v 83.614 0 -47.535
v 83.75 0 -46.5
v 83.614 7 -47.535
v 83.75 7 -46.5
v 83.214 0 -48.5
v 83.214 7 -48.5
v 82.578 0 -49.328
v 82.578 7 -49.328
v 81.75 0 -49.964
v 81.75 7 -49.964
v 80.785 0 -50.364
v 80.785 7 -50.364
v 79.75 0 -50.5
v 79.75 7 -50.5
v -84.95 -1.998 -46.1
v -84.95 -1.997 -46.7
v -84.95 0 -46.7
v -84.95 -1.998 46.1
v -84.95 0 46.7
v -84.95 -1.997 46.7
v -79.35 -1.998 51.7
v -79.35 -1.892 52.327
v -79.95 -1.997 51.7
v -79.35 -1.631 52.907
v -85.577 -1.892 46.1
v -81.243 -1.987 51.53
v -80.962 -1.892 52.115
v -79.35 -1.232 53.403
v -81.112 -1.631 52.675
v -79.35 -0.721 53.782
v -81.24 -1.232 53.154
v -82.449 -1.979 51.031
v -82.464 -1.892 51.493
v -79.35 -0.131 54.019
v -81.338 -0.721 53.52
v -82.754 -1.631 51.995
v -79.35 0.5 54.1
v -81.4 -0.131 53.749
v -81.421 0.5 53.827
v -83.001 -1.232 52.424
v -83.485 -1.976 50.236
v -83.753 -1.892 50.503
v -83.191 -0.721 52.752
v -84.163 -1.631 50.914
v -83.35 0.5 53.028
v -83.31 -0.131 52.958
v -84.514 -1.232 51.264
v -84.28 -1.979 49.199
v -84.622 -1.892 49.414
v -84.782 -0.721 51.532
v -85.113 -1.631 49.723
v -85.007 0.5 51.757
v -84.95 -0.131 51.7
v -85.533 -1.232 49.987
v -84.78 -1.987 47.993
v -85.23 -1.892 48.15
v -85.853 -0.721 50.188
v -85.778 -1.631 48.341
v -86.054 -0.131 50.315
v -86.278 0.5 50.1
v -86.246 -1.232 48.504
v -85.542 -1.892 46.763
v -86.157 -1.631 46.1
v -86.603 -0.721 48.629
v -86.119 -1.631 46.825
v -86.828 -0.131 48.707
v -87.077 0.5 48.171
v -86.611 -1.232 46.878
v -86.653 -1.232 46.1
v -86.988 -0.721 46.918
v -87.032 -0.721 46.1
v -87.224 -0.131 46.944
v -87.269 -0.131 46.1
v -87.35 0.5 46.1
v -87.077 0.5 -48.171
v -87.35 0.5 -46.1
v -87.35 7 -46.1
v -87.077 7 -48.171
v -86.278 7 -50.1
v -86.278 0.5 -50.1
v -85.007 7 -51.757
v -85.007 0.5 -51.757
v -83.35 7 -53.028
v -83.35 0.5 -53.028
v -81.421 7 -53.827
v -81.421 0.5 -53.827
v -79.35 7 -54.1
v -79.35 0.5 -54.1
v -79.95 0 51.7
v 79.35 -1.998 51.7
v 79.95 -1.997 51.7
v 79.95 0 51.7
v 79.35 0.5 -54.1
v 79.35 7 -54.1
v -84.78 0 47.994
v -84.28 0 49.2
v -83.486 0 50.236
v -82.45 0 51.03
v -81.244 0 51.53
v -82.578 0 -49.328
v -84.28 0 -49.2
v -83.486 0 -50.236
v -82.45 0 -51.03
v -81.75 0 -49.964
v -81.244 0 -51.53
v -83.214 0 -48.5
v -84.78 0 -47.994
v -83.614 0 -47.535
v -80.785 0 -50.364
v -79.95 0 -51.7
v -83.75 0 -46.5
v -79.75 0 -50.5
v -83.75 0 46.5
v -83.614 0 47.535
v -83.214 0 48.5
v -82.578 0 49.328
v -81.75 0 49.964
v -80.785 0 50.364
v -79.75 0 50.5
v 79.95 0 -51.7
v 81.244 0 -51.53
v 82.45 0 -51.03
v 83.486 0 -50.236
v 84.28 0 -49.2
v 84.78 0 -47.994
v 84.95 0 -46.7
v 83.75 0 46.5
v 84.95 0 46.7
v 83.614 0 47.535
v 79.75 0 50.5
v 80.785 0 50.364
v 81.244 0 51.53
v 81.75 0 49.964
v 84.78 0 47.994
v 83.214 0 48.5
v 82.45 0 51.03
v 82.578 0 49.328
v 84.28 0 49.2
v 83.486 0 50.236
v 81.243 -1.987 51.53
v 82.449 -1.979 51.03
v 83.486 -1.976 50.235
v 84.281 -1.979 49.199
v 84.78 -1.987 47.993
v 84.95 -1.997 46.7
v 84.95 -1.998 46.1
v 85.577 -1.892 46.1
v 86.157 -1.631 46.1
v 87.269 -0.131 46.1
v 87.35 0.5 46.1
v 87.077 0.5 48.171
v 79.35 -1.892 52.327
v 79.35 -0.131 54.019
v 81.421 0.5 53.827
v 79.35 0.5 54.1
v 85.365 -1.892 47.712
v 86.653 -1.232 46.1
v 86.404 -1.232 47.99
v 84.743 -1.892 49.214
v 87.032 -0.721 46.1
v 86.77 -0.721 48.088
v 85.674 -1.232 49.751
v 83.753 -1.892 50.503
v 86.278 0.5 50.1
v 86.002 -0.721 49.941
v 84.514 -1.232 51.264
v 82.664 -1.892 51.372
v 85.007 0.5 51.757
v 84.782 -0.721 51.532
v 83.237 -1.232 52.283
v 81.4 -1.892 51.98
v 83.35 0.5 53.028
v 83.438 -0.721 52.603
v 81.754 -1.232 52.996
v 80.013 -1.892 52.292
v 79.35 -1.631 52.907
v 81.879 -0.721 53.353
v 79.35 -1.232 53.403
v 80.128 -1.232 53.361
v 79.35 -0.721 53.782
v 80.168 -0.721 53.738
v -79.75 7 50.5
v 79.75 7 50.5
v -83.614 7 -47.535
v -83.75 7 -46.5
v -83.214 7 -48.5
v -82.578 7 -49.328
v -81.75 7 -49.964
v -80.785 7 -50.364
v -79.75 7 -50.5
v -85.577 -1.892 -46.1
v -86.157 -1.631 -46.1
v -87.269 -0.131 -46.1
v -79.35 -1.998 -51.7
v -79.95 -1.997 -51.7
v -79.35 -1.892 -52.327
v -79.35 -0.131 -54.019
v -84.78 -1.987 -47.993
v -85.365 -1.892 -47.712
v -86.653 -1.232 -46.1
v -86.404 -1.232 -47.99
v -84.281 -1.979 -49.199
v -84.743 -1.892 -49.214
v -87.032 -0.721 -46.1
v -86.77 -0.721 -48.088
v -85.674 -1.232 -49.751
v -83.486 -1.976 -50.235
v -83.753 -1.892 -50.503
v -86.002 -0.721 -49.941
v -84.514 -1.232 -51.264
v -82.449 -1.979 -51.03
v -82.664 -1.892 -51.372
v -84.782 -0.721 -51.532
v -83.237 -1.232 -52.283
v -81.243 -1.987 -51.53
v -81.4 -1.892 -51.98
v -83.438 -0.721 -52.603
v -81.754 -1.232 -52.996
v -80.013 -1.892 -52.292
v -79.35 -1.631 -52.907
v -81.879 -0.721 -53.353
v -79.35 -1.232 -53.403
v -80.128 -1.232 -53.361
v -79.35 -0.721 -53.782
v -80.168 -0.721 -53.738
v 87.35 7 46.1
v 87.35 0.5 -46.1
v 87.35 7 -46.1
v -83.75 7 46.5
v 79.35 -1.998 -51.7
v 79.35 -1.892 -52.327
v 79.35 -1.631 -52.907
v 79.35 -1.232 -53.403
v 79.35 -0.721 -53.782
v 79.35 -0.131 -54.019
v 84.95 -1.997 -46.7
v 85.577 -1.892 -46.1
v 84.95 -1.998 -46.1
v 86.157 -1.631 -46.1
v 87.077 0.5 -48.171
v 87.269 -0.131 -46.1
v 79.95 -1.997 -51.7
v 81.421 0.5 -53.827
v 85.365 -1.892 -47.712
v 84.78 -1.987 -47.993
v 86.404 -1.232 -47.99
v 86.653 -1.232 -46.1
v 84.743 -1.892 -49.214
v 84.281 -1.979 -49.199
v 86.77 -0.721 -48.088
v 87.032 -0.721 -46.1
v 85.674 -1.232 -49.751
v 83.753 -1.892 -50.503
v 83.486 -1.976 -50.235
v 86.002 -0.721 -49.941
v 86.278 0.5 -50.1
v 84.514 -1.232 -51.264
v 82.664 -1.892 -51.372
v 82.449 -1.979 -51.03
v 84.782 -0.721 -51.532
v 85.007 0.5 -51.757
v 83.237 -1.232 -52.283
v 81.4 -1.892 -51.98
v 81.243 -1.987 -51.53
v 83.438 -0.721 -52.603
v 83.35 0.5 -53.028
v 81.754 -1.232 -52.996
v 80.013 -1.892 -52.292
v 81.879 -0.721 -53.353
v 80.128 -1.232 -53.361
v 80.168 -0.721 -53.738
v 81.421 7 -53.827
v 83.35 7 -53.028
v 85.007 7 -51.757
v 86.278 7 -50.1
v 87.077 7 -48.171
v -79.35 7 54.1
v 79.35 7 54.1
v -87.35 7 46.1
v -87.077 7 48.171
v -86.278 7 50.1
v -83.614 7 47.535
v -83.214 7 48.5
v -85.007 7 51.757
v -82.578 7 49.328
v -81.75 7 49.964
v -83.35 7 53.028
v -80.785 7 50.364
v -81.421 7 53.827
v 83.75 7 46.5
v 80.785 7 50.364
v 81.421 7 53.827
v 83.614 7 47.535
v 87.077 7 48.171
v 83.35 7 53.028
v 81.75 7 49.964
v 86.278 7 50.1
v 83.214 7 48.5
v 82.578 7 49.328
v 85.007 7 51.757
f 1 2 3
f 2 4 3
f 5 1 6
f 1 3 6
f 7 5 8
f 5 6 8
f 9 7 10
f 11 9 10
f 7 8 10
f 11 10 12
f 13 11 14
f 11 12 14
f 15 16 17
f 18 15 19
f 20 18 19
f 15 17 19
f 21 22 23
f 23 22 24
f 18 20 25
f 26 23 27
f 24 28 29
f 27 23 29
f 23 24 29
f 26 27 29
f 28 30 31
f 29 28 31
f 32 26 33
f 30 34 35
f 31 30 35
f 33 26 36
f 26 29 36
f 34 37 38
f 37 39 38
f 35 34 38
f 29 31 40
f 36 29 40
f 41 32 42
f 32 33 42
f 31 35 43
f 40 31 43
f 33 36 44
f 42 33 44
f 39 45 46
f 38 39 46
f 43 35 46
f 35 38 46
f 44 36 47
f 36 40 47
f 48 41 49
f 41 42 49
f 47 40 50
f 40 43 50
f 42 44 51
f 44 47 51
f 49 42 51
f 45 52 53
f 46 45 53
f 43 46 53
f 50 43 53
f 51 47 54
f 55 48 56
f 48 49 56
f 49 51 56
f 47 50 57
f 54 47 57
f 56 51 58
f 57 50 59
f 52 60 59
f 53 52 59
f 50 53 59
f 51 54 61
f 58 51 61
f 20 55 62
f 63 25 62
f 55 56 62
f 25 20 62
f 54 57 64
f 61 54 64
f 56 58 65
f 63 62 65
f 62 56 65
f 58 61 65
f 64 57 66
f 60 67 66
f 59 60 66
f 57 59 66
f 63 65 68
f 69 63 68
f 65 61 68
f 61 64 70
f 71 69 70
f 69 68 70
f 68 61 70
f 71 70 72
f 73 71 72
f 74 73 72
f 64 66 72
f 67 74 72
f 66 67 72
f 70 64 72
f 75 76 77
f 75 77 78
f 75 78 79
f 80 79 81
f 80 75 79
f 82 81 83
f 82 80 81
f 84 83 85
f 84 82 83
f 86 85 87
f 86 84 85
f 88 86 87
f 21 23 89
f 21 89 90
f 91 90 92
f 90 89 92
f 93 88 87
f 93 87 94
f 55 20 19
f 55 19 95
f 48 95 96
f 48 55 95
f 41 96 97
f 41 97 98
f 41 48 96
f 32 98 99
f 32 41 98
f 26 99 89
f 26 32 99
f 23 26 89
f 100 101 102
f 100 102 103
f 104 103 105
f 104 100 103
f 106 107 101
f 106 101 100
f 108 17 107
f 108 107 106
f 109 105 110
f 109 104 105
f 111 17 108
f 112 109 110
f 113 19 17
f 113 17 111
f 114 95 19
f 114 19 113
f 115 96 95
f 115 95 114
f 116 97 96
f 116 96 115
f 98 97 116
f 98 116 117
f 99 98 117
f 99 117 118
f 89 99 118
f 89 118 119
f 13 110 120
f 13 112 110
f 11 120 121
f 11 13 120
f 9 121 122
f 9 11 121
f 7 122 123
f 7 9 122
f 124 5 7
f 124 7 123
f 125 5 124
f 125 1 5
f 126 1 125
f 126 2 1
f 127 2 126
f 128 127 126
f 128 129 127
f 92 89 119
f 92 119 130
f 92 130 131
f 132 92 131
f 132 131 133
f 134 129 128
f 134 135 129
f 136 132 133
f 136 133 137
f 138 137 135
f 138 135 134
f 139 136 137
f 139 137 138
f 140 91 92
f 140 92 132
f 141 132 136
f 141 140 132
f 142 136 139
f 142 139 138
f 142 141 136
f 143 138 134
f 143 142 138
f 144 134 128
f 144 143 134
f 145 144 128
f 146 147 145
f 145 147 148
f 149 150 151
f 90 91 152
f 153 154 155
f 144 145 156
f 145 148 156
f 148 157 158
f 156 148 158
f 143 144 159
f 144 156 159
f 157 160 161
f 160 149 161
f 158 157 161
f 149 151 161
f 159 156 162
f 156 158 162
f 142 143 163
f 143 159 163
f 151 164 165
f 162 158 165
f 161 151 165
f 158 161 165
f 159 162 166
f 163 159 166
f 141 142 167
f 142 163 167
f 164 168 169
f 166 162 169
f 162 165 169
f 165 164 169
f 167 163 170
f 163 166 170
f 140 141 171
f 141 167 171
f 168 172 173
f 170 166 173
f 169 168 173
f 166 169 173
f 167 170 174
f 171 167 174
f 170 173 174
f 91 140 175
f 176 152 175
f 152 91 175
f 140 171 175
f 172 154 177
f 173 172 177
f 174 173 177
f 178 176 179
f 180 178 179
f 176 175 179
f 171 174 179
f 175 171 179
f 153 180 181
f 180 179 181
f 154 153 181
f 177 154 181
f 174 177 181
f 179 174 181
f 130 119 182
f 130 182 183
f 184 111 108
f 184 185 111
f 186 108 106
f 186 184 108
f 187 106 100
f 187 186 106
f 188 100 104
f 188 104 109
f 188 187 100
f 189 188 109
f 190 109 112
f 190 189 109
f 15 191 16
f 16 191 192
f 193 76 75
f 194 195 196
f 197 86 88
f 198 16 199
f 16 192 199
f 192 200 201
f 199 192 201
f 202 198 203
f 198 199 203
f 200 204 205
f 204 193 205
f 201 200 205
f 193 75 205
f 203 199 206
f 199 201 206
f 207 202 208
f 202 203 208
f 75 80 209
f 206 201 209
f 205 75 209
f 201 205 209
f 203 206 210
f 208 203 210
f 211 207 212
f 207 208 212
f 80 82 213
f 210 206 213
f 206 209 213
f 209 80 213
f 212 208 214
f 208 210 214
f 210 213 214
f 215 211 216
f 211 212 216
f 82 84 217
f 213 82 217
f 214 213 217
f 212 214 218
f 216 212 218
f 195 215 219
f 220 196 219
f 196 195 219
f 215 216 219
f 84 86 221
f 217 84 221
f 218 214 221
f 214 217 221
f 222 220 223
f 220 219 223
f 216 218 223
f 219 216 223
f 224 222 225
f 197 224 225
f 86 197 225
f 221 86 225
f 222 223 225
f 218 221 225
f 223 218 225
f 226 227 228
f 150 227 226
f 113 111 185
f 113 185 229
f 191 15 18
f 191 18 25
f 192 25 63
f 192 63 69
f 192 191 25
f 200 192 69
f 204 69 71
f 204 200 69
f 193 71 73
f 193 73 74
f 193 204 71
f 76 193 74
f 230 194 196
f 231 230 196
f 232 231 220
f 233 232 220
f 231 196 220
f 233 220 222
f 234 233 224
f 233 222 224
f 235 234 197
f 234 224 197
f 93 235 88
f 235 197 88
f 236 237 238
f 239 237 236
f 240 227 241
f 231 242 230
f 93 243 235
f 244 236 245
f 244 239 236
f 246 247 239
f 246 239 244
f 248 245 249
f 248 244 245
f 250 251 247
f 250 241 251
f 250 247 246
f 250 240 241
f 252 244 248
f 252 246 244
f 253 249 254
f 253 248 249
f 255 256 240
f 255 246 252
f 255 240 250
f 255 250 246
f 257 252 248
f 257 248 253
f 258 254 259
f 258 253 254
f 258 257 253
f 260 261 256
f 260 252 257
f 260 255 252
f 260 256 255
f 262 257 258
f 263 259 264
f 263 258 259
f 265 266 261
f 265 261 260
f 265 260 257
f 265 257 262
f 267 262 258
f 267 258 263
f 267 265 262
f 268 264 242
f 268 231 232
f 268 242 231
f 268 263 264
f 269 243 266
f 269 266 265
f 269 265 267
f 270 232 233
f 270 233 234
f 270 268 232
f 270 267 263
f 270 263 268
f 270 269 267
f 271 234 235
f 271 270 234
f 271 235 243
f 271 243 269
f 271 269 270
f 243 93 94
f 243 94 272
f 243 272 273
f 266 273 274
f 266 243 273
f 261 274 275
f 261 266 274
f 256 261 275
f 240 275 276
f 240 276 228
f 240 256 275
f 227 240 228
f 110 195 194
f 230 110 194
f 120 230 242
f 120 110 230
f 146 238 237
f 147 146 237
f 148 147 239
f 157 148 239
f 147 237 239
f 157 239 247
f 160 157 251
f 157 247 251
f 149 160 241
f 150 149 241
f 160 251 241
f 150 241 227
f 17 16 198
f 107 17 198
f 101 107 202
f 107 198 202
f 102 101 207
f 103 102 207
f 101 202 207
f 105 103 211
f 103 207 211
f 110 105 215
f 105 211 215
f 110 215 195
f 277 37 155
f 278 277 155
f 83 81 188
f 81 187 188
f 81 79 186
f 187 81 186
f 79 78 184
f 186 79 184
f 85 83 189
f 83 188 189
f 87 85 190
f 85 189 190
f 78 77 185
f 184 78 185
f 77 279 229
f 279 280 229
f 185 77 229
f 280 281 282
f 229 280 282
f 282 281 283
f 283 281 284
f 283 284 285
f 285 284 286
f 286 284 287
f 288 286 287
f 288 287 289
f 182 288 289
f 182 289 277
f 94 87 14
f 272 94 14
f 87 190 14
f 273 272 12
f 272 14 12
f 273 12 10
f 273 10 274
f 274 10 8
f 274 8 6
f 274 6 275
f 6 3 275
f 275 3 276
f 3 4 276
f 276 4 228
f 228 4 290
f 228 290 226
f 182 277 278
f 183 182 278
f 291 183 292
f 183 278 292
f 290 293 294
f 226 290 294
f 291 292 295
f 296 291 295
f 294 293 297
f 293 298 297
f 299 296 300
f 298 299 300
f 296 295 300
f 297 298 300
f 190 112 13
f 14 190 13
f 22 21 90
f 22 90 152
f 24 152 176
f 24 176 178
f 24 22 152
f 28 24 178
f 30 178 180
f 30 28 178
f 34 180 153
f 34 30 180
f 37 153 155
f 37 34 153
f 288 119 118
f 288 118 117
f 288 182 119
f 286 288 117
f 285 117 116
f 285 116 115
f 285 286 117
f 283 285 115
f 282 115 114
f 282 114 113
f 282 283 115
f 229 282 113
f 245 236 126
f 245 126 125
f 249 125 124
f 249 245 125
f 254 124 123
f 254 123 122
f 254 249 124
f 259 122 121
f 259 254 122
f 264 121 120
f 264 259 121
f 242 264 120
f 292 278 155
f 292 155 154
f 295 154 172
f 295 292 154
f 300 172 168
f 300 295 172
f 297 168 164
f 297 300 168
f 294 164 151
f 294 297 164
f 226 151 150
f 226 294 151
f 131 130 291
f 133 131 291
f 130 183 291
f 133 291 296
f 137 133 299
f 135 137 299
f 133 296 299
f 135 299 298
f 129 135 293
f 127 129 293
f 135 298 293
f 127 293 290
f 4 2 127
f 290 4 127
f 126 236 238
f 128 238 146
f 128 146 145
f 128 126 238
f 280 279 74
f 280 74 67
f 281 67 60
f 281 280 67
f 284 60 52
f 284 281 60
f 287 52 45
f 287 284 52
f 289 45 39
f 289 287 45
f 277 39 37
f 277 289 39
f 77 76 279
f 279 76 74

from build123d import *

# Parameters (mm, degrees)
F0_W         = 174.7
F0_H         = 108.2
F0_W_2       = 169.9
F0_H_2       = 103.4
F1_DEPTH     = 2
F0_W_3       = 167.5
F0_H_3       = 101
F2_DEPTH     = 7
F3_R         = 4
F4_R         = 5
F5_R         = 8
F6_T1_DEPTH  = 158.7
F6_T3_DEPTH  = 92.2
F6_T6_ANGLE  = 90
F6_T8_ANGLE  = 90
F6_T10_ANGLE = 90
F6_T12_ANGLE = 90


# Not quite as in the source:
# - a fillet or chamfer that OpenCascade refuses, or shapes differently, is made with other operations: its cross-section is extruded or revolved along the edge and cut away or added


with BuildPart() as f1:
    # F0 (on Front) → F1 (new body)
    with BuildSketch(Plane.XZ):
        Rectangle(F0_W, F0_H)
        Rectangle(F0_W_2, F0_H_2, mode=Mode.SUBTRACT)
    extrude(amount=F1_DEPTH)

    # F0 (on Front) → F2 (join)
    with BuildSketch(Plane.XZ):
        Rectangle(F0_W, F0_H)
        Rectangle(F0_W_2, F0_H_2, mode=Mode.SUBTRACT)
        Rectangle(F0_W_2, F0_H_2)
        Rectangle(F0_W_3, F0_H_3, mode=Mode.SUBTRACT)
    extrude(amount=-F2_DEPTH)

    # F3
    f3_edges = [f1.edges().sort_by_distance(p)[0] for p in [
        (83.75, 3.5, 50.5),
        (-83.75, 3.5, 50.5),
        (-83.75, 3.5, -50.5),
        (83.75, 3.5, -50.5),
    ]]
    fillet(f3_edges, radius=F3_R)

    # F4
    f4_edges = [f1.edges().sort_by_distance(p)[0] for p in [
        (84.95, -1, 51.7),
        (84.95, -1, -51.7),
        (-84.95, -1, -51.7),
        (-84.95, -1, 51.7),
    ]]
    fillet(f4_edges, radius=F4_R)

    # F5
    f5_edges = [f1.edges().sort_by_distance(p)[0] for p in [
        (87.35, 2.5, -54.1),
        (-87.35, 2.5, -54.1),
        (-87.35, 2.5, 54.1),
        (87.35, 2.5, 54.1),
    ]]
    fillet(f5_edges, radius=F5_R)

    # F6: fillet of radius 2.5 on 1 edges, made by hand

    # F6_s2 → F6_t1 (cut)
    with BuildSketch(Plane.YZ.offset(-79.35)):
        with BuildLine():
            ThreePointArc((-2, 51.6), (-1.267766953, 53.367766953), (0.5, 54.1))
            Line((0.5, 54.1), (-2, 54.1))
            Line((-2, 54.1), (-2, 51.6))
        make_face()
        with BuildLine():
            ThreePointArc((-2, -51.6), (-1.267766953, -53.367766953), (0.5, -54.1))
            Line((0.5, -54.1), (-2, -54.1))
            Line((-2, -54.1), (-2, -51.6))
        make_face()
    extrude(amount=F6_T1_DEPTH, mode=Mode.SUBTRACT)

    # F6_s4 → F6_t3 (cut)
    with BuildSketch(Plane.XY.offset(-46.1)):
        with BuildLine():
            ThreePointArc((-84.85, -2), (-86.617766953, -1.267766953), (-87.35, 0.5))
            Line((-87.35, 0.5), (-87.35, -2))
            Line((-87.35, -2), (-84.85, -2))
        make_face()
        with BuildLine():
            ThreePointArc((84.85, -2), (86.617766953, -1.267766953), (87.35, 0.5))
            Line((87.35, 0.5), (87.35, -2))
            Line((87.35, -2), (84.85, -2))
        make_face()
    extrude(amount=F6_T3_DEPTH, mode=Mode.SUBTRACT)

    # F6_s5 → F6_t6 (revolve, cut)
    with BuildSketch(Plane.YZ.offset(-79.35)):
        with BuildLine():
            ThreePointArc((-2, 51.6), (-1.267766953, 53.367766953), (0.5, 54.1))
            Line((0.5, 54.1), (-2, 54.1))
            Line((-2, 54.1), (-2, 51.6))
        make_face()
    revolve(axis=Axis((-79.35, -2, 46.1), (0, -1, 0)), revolution_arc=F6_T6_ANGLE, mode=Mode.SUBTRACT)

    # F6_s7 → F6_t8 (revolve, cut)
    with BuildSketch(Plane.XY.offset(-46.1)):
        with BuildLine():
            ThreePointArc((-84.85, -2), (-86.617766953, -1.267766953), (-87.35, 0.5))
            Line((-87.35, 0.5), (-87.35, -2))
            Line((-87.35, -2), (-84.85, -2))
        make_face()
    revolve(axis=Axis((-79.35, -2, -46.1), (0, -1, 0)), revolution_arc=F6_T8_ANGLE, mode=Mode.SUBTRACT)

    # F6_s9 → F6_t10 (revolve, cut)
    with BuildSketch(Plane.XY.offset(-46.1)):
        with BuildLine():
            ThreePointArc((84.85, -2), (86.617766953, -1.267766953), (87.35, 0.5))
            Line((87.35, 0.5), (87.35, -2))
            Line((87.35, -2), (84.85, -2))
        make_face()
    revolve(axis=Axis((79.35, -2, -46.1), (0, 1, 0)), revolution_arc=F6_T10_ANGLE, mode=Mode.SUBTRACT)

    # F6_s11 → F6_t12 (revolve, cut)
    with BuildSketch(Plane.XY.offset(46.1)):
        with BuildLine():
            ThreePointArc((84.85, -2), (86.617766953, -1.267766953), (87.35, 0.5))
            Line((87.35, 0.5), (87.35, -2))
            Line((87.35, -2), (84.85, -2))
        make_face()
    revolve(axis=Axis((79.35, -2, 46.1), (0, -1, 0)), revolution_arc=F6_T12_ANGLE, mode=Mode.SUBTRACT)


solid = f1.part
